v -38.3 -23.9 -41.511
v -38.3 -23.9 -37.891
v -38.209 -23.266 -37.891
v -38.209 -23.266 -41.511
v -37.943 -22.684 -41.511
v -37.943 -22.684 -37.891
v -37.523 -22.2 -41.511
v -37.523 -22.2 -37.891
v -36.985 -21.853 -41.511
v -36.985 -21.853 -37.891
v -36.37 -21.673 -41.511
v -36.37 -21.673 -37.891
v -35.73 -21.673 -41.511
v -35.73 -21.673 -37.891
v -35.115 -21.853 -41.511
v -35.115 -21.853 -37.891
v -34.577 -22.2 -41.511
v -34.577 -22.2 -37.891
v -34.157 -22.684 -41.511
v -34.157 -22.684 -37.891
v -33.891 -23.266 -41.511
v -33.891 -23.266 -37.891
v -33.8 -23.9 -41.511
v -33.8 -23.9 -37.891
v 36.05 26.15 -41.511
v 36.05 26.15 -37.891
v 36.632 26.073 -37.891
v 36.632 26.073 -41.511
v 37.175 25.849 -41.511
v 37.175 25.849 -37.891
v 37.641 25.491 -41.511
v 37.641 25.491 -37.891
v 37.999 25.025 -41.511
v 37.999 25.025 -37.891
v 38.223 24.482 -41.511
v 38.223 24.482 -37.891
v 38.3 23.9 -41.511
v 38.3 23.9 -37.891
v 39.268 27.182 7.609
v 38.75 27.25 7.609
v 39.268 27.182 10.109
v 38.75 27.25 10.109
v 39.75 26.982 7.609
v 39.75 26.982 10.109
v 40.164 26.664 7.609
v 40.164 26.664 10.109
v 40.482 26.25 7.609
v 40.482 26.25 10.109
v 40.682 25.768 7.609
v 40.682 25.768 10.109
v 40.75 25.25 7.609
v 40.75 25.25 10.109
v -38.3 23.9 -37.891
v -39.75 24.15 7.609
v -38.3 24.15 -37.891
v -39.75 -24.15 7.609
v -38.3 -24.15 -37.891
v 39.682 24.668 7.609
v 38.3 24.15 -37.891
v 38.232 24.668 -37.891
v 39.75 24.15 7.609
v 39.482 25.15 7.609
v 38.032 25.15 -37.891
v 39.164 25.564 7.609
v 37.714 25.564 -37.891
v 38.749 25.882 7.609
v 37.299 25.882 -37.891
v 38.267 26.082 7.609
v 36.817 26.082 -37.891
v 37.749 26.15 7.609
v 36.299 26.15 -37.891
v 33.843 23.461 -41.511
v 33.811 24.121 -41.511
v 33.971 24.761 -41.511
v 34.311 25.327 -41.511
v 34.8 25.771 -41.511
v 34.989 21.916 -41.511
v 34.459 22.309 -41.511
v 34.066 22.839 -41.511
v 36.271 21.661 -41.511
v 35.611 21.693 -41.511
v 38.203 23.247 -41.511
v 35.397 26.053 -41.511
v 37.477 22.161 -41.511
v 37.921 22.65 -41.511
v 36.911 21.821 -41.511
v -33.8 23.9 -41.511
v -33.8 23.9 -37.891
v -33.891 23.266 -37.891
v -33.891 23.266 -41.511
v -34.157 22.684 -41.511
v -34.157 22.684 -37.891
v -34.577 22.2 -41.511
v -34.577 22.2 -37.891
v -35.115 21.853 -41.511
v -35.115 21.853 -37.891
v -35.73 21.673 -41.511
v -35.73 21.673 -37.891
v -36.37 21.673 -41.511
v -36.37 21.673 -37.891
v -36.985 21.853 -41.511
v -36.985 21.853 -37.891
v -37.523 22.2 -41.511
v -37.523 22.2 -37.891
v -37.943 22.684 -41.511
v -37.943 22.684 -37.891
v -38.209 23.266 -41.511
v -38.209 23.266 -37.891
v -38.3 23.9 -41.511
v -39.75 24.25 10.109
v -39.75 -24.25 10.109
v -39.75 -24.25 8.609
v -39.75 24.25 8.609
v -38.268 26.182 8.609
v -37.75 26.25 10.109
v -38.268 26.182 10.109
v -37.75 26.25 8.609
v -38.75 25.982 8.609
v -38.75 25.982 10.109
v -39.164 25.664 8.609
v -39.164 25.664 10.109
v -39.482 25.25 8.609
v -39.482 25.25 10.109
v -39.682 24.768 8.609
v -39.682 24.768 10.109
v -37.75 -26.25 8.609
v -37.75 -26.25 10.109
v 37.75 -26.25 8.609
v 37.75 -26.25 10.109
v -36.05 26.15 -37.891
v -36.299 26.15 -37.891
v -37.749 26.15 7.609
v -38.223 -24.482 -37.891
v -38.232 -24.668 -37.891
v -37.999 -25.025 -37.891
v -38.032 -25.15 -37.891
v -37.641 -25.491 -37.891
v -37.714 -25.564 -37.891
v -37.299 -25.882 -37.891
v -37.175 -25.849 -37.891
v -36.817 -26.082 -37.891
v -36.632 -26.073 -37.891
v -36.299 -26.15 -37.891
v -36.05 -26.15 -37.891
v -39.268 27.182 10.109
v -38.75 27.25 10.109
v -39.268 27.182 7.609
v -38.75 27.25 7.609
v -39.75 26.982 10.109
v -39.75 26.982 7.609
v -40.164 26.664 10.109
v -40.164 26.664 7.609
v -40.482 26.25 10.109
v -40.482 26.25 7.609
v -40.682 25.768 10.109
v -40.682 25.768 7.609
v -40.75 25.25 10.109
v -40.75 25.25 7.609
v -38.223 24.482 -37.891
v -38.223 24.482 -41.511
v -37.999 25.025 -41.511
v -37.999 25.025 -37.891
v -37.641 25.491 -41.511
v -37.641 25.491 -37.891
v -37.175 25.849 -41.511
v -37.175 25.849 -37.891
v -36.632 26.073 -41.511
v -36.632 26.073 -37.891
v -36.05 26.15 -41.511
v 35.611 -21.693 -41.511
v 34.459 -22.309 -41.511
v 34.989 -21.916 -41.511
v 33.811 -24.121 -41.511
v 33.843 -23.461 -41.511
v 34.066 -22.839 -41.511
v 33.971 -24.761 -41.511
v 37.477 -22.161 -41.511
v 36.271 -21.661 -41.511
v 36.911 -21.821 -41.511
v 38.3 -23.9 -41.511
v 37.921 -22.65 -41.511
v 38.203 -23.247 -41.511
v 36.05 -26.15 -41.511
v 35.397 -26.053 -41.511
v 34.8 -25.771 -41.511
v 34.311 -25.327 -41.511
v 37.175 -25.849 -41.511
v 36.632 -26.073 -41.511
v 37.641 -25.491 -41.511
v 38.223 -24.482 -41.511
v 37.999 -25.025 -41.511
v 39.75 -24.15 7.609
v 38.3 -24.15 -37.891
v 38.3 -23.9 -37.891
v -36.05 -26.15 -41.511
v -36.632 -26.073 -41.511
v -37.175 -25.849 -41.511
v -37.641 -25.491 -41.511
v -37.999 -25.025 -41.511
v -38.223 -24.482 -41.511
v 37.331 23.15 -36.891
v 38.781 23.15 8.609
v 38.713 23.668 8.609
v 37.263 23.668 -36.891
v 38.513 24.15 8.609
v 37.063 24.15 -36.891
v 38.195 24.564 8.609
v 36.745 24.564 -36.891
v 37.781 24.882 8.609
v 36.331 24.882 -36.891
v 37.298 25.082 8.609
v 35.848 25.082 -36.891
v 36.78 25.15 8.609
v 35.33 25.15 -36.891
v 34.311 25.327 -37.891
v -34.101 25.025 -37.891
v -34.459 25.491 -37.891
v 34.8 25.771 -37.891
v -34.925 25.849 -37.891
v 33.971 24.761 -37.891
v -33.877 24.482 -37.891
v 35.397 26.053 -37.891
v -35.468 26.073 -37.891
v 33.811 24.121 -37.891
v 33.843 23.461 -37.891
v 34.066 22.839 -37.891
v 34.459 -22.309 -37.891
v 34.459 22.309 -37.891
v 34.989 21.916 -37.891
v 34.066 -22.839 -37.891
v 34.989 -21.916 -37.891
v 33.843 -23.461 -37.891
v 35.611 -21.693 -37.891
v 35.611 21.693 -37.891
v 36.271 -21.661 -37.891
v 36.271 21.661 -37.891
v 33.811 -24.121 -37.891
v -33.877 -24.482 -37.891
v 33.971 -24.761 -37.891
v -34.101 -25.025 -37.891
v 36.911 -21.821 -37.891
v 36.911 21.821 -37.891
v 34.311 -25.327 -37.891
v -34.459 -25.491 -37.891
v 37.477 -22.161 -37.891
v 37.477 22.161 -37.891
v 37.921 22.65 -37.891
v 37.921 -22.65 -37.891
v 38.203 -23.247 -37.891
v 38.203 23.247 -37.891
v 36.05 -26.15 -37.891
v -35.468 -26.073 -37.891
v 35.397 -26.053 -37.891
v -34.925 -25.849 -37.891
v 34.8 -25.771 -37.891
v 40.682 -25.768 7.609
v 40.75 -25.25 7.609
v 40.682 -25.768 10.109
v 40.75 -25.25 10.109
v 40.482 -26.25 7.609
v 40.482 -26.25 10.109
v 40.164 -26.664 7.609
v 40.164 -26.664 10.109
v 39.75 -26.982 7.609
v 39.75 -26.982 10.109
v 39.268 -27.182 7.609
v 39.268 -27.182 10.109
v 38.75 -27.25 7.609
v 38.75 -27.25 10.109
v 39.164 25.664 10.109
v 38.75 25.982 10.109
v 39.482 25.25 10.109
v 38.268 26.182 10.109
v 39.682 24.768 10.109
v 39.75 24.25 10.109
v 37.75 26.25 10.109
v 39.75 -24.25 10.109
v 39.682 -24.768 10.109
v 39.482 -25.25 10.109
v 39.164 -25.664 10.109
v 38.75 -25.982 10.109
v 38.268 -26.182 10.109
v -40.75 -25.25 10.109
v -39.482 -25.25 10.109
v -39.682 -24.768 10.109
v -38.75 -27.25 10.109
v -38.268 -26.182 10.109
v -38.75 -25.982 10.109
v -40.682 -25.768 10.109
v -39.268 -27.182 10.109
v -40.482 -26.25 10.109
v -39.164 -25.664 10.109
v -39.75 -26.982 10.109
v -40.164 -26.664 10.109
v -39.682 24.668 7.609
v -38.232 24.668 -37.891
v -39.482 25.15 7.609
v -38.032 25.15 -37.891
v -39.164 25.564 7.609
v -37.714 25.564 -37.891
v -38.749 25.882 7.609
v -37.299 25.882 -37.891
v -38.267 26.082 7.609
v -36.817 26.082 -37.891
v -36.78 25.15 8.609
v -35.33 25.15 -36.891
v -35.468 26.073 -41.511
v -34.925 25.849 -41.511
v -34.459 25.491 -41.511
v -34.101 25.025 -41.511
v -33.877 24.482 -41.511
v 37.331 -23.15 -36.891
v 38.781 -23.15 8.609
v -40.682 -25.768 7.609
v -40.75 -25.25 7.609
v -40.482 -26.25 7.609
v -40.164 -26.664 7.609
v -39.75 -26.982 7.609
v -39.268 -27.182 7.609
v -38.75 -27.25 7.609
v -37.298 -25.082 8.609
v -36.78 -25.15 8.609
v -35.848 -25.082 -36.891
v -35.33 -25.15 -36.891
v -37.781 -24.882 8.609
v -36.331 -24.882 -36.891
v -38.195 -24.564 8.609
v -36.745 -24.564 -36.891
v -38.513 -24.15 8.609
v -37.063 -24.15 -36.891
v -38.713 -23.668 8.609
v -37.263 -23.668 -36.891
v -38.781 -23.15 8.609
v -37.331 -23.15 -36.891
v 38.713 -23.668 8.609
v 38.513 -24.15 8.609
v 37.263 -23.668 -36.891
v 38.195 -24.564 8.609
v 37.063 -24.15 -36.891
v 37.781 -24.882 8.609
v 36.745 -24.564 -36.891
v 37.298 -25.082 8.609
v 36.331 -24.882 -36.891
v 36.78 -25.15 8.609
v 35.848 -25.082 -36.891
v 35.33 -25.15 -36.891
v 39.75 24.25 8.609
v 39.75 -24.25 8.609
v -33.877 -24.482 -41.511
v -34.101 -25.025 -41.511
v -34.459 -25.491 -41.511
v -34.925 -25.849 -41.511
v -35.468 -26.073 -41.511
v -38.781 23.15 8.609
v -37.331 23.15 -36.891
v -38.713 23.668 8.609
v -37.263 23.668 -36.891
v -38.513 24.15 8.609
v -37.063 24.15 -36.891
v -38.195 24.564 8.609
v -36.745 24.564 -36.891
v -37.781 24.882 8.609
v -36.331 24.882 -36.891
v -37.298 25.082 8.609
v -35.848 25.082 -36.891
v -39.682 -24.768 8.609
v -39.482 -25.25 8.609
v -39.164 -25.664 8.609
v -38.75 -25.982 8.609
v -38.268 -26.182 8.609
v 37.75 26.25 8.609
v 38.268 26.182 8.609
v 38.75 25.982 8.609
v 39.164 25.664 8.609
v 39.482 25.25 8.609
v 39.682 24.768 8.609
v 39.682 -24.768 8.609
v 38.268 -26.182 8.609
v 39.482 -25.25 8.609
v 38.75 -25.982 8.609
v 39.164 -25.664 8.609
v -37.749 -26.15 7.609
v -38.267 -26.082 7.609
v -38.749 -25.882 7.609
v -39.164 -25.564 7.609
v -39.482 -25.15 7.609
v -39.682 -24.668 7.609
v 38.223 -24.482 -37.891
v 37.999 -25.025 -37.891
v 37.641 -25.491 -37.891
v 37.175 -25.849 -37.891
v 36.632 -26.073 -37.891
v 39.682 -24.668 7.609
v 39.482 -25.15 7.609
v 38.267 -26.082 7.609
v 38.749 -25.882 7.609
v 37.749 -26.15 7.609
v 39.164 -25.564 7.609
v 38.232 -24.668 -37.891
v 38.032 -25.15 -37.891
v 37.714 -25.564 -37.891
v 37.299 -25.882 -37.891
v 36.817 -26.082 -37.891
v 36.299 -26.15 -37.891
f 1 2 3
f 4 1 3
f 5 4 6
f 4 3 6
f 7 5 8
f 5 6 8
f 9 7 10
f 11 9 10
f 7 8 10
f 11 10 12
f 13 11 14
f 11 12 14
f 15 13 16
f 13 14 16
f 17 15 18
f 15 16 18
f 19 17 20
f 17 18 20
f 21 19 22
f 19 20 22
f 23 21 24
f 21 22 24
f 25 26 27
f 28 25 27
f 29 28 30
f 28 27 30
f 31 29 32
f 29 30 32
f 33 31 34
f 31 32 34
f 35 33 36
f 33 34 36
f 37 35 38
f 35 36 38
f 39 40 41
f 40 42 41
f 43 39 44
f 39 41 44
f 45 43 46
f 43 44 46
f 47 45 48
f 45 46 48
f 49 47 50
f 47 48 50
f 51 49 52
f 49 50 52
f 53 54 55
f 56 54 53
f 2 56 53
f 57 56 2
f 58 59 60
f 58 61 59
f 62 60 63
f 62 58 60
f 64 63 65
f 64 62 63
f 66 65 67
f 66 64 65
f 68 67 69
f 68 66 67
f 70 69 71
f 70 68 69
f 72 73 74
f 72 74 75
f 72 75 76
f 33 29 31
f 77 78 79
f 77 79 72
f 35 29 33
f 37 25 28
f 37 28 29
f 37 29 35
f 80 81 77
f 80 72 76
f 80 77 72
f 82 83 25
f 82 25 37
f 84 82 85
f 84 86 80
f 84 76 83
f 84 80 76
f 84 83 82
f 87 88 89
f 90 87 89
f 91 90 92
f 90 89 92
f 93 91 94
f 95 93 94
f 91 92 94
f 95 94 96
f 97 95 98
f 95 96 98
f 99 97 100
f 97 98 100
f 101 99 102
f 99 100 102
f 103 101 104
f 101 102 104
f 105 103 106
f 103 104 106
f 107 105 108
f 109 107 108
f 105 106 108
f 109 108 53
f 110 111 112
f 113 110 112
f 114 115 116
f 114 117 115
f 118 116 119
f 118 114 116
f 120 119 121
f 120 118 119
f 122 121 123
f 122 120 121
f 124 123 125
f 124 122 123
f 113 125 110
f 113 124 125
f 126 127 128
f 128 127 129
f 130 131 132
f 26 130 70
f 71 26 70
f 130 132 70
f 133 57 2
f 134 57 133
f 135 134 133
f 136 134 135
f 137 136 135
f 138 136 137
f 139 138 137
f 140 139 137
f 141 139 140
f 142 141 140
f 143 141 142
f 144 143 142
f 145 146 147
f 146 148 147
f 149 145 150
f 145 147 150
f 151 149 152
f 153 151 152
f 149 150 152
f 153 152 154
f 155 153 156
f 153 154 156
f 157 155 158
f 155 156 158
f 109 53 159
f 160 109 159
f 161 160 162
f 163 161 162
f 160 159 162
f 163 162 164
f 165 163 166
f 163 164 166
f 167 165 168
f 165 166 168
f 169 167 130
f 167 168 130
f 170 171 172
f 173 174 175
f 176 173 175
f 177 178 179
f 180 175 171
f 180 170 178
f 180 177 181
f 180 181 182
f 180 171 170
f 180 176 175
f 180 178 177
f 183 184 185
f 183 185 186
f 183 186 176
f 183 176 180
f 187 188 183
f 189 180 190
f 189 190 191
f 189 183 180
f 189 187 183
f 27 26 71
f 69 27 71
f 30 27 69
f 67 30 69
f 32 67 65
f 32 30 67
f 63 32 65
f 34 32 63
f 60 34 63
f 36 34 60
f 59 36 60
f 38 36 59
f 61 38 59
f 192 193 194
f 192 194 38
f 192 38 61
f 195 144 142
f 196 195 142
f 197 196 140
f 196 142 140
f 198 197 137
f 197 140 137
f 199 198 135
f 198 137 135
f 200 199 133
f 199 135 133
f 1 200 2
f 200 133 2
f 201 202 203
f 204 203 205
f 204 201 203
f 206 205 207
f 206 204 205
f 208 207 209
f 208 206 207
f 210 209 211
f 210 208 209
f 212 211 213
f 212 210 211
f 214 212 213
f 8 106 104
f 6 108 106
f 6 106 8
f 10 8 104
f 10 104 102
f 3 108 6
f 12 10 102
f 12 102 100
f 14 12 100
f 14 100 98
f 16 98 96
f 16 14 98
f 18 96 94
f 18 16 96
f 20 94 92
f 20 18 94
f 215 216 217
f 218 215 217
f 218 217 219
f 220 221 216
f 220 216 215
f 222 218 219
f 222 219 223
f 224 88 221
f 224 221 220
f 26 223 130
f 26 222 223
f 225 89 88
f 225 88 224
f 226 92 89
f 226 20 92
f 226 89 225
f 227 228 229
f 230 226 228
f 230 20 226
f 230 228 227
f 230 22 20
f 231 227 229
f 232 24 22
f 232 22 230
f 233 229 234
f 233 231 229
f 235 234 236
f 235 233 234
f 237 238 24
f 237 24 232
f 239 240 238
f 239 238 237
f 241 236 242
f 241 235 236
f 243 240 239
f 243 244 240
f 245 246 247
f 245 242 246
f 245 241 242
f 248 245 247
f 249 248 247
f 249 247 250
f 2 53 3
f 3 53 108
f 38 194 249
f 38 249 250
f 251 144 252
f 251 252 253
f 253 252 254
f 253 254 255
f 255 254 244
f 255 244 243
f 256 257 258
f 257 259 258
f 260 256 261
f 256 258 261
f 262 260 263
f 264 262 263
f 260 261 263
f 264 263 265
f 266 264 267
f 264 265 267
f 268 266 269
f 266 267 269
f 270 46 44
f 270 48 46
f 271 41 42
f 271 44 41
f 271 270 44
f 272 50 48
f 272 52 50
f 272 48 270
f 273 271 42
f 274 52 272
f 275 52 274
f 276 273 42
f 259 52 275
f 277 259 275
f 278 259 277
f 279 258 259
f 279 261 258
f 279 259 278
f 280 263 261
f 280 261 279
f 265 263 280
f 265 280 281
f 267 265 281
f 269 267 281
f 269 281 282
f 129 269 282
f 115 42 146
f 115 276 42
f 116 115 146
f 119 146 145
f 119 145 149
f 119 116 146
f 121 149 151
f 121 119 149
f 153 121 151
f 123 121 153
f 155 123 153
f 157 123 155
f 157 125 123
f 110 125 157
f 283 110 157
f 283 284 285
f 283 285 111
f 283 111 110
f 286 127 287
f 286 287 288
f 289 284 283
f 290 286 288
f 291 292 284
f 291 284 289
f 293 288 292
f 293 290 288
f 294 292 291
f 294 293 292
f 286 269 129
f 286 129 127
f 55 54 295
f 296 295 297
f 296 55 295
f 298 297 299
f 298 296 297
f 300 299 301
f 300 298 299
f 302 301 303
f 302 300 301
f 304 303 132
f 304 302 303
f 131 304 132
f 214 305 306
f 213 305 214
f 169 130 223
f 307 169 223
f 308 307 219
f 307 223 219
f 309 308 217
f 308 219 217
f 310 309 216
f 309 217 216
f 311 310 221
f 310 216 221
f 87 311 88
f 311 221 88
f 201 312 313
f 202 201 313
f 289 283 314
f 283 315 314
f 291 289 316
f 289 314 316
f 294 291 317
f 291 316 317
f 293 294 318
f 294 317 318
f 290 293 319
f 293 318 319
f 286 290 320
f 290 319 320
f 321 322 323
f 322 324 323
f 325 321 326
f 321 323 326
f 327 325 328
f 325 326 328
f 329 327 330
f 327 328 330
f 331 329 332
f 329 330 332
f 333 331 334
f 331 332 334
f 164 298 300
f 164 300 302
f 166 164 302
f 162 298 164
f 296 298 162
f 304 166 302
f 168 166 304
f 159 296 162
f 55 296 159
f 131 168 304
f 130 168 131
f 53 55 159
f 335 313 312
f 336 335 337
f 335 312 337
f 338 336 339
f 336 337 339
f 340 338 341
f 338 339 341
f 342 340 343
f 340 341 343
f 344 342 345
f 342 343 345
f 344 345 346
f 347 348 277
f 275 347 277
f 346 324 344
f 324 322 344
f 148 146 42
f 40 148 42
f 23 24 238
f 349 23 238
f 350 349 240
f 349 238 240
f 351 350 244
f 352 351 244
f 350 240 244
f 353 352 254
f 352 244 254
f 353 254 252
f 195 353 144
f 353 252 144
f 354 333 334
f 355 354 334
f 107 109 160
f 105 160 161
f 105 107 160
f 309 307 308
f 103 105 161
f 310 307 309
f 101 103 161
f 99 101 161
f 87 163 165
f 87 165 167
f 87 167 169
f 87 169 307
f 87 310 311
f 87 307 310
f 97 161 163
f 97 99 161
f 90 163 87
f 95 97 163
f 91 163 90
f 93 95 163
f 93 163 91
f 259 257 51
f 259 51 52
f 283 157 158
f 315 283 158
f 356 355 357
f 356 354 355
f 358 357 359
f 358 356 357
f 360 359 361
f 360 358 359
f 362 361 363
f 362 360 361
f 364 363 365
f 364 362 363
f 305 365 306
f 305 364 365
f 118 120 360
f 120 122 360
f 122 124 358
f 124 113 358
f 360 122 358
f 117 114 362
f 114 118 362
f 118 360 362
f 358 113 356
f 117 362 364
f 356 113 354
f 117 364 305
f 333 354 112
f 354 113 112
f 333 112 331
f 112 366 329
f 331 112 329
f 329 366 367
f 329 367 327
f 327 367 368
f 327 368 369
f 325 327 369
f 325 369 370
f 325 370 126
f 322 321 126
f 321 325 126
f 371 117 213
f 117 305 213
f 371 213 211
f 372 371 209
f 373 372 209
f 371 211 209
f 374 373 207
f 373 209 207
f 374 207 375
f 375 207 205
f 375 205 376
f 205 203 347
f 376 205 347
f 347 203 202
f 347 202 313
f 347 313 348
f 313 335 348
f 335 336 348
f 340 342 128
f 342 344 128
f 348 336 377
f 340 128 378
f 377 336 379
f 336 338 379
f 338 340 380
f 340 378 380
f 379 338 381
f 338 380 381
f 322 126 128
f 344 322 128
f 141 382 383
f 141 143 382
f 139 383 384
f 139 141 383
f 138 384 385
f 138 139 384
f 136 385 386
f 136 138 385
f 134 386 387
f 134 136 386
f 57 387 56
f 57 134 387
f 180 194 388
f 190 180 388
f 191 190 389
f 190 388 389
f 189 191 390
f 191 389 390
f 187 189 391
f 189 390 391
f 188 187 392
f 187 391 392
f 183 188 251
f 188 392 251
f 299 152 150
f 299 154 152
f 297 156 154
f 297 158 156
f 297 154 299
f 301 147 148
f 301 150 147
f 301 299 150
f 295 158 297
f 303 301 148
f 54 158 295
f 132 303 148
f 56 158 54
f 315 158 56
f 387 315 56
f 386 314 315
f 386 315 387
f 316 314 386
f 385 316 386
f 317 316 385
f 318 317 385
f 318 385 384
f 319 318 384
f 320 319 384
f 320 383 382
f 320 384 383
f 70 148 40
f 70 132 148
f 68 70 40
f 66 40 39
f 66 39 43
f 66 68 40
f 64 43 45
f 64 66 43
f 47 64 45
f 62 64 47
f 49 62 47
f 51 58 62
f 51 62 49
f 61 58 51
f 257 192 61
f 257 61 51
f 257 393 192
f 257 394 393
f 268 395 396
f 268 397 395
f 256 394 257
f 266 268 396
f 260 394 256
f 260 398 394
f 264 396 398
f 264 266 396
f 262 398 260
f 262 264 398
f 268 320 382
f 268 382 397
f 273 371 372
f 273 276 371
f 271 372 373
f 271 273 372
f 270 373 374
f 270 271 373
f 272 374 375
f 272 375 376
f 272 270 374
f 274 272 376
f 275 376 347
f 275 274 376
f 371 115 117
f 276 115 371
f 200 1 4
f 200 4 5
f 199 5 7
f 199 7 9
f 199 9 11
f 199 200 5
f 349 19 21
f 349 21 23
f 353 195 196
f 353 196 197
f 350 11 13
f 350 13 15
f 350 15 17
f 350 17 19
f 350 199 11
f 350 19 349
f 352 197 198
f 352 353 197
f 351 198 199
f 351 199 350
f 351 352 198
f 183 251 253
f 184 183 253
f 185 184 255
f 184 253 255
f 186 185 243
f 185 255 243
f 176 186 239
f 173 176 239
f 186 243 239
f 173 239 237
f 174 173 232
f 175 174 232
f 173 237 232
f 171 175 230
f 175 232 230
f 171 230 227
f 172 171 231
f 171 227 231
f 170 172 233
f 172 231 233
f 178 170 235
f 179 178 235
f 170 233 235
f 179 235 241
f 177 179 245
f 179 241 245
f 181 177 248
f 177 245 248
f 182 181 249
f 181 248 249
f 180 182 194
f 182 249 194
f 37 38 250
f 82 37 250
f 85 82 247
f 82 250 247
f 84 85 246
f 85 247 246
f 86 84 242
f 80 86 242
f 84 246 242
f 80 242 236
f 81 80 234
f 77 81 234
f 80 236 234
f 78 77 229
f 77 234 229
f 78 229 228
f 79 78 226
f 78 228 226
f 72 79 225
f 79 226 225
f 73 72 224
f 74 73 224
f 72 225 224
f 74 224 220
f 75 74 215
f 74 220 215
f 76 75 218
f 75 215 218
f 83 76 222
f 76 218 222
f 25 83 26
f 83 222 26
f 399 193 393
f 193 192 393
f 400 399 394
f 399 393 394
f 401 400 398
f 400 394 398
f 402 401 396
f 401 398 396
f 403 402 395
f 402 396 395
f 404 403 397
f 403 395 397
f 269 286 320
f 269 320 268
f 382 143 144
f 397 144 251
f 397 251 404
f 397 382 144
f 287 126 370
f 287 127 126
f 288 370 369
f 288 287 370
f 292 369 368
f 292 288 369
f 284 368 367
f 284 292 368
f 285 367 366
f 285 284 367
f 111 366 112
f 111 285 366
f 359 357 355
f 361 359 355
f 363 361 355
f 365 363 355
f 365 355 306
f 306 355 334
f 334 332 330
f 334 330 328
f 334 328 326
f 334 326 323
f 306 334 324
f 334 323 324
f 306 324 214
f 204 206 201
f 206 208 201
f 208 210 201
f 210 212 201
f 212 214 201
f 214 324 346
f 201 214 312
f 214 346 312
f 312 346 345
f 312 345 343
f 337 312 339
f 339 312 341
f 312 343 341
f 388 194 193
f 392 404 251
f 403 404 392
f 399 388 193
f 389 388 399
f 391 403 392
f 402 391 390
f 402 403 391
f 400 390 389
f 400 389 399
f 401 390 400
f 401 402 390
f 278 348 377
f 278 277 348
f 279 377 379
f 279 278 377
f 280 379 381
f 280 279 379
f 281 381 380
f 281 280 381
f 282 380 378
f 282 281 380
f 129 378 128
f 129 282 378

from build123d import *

# Parameters (mm, degrees)
F1_DEPTH = 27.25
F2_DEPTH = 26.15
F4_T     = -1
F5_DEPTH = 3.62
F6_R     = 2


with BuildPart() as f1:
    # F0 (on Front) → F1 (new body, symmetric)
    with BuildSketch(Plane.XZ):
        Polygon((40.75, 10.1086891984), (0, 10.1086891984), (-40.75, 10.1086891984), (-40.75, 7.6086891984), (-39.75, 7.6086891984), (39.75, 7.6086891984), (40.75, 7.6086891984), align=None)
    extrude(amount=F1_DEPTH, both=True)

    # F0 (on Front) → F2 (join, symmetric)
    with BuildSketch(Plane.XZ):
        Polygon((39.75, 7.6086891984), (-39.75, 7.6086891984), (-38.3, -37.8913108016), (0, -37.8913108016), (38.3, -37.8913108016), align=None)
    extrude(amount=F2_DEPTH, both=True)

    # F4
    f4_openings = [f1.faces().sort_by_distance(p)[0] for p in [
        (0, 0, 10.108689),
    ]]
    offset(amount=F4_T, openings=f4_openings, kind=Kind.INTERSECTION)

    # F3 (on face) → F5 (join)
    with BuildSketch(Plane(origin=(0, 0, -37.8913108016), x_dir=(1, 0, 0), z_dir=(0, 0, -1))):
        with BuildLine():
            ThreePointArc((-38.3, 23.9), (-36.05, 21.65), (-33.8, 23.9))
            ThreePointArc((-33.8, 23.9), (-34.4590097351, 25.4909902504), (-36.0499999795, 26.15))
            ThreePointArc((-36.0499999795, 26.15), (-37.6409902504, 25.4909902649), (-38.3, 23.9))
        make_face()
        with BuildLine():
            ThreePointArc((-33.8, -23.9), (-36.0499999898, -21.65), (-38.3, -23.8999999795))
            ThreePointArc((-38.3, -23.8999999795), (-37.6409902649, -25.4909902504), (-36.05, -26.15))
            ThreePointArc((-36.05, -26.15), (-34.4590097423, -25.4909902577), (-33.8, -23.9))
        make_face()
        with BuildLine():
            ThreePointArc((36.05, -26.15), (37.6409902577, -25.4909902577), (38.3, -23.9))
            ThreePointArc((38.3, -23.9), (34.4590097423, -22.3090097423), (36.05, -26.15))
        make_face()
        with BuildLine():
            ThreePointArc((38.3, 23.9), (37.6409902577, 25.4909902577), (36.05, 26.15))
            ThreePointArc((36.05, 26.15), (34.4590097423, 22.3090097423), (38.3, 23.9))
        make_face()
    extrude(amount=F5_DEPTH)

    # F6
    f6_edges = [f1.edges().sort_by_distance(p)[0] for p in [
        (-39.025, -26.15, -15.141311),
        (39.025, -26.15, -15.141311),
        (39.025, 26.15, -15.141311),
        (-39.025, 26.15, -15.141311),
        (-40.75, 27.25, 8.858689),
        (-40.75, -27.25, 8.858689),
        (40.75, -27.25, 8.858689),
        (40.75, 27.25, 8.858689),
        (38.05636, -25.15, -14.141311),
        (-38.05636, -25.15, -14.141311),
        (-38.05636, 25.15, -14.141311),
        (38.05636, 25.15, -14.141311),
        (39.75, 26.25, 9.358689),
        (-39.75, 26.25, 9.358689),
        (39.75, -26.25, 9.358689),
        (-39.75, -26.25, 9.358689),
    ]]
    fillet(f6_edges, radius=F6_R)


solid = f1.part
